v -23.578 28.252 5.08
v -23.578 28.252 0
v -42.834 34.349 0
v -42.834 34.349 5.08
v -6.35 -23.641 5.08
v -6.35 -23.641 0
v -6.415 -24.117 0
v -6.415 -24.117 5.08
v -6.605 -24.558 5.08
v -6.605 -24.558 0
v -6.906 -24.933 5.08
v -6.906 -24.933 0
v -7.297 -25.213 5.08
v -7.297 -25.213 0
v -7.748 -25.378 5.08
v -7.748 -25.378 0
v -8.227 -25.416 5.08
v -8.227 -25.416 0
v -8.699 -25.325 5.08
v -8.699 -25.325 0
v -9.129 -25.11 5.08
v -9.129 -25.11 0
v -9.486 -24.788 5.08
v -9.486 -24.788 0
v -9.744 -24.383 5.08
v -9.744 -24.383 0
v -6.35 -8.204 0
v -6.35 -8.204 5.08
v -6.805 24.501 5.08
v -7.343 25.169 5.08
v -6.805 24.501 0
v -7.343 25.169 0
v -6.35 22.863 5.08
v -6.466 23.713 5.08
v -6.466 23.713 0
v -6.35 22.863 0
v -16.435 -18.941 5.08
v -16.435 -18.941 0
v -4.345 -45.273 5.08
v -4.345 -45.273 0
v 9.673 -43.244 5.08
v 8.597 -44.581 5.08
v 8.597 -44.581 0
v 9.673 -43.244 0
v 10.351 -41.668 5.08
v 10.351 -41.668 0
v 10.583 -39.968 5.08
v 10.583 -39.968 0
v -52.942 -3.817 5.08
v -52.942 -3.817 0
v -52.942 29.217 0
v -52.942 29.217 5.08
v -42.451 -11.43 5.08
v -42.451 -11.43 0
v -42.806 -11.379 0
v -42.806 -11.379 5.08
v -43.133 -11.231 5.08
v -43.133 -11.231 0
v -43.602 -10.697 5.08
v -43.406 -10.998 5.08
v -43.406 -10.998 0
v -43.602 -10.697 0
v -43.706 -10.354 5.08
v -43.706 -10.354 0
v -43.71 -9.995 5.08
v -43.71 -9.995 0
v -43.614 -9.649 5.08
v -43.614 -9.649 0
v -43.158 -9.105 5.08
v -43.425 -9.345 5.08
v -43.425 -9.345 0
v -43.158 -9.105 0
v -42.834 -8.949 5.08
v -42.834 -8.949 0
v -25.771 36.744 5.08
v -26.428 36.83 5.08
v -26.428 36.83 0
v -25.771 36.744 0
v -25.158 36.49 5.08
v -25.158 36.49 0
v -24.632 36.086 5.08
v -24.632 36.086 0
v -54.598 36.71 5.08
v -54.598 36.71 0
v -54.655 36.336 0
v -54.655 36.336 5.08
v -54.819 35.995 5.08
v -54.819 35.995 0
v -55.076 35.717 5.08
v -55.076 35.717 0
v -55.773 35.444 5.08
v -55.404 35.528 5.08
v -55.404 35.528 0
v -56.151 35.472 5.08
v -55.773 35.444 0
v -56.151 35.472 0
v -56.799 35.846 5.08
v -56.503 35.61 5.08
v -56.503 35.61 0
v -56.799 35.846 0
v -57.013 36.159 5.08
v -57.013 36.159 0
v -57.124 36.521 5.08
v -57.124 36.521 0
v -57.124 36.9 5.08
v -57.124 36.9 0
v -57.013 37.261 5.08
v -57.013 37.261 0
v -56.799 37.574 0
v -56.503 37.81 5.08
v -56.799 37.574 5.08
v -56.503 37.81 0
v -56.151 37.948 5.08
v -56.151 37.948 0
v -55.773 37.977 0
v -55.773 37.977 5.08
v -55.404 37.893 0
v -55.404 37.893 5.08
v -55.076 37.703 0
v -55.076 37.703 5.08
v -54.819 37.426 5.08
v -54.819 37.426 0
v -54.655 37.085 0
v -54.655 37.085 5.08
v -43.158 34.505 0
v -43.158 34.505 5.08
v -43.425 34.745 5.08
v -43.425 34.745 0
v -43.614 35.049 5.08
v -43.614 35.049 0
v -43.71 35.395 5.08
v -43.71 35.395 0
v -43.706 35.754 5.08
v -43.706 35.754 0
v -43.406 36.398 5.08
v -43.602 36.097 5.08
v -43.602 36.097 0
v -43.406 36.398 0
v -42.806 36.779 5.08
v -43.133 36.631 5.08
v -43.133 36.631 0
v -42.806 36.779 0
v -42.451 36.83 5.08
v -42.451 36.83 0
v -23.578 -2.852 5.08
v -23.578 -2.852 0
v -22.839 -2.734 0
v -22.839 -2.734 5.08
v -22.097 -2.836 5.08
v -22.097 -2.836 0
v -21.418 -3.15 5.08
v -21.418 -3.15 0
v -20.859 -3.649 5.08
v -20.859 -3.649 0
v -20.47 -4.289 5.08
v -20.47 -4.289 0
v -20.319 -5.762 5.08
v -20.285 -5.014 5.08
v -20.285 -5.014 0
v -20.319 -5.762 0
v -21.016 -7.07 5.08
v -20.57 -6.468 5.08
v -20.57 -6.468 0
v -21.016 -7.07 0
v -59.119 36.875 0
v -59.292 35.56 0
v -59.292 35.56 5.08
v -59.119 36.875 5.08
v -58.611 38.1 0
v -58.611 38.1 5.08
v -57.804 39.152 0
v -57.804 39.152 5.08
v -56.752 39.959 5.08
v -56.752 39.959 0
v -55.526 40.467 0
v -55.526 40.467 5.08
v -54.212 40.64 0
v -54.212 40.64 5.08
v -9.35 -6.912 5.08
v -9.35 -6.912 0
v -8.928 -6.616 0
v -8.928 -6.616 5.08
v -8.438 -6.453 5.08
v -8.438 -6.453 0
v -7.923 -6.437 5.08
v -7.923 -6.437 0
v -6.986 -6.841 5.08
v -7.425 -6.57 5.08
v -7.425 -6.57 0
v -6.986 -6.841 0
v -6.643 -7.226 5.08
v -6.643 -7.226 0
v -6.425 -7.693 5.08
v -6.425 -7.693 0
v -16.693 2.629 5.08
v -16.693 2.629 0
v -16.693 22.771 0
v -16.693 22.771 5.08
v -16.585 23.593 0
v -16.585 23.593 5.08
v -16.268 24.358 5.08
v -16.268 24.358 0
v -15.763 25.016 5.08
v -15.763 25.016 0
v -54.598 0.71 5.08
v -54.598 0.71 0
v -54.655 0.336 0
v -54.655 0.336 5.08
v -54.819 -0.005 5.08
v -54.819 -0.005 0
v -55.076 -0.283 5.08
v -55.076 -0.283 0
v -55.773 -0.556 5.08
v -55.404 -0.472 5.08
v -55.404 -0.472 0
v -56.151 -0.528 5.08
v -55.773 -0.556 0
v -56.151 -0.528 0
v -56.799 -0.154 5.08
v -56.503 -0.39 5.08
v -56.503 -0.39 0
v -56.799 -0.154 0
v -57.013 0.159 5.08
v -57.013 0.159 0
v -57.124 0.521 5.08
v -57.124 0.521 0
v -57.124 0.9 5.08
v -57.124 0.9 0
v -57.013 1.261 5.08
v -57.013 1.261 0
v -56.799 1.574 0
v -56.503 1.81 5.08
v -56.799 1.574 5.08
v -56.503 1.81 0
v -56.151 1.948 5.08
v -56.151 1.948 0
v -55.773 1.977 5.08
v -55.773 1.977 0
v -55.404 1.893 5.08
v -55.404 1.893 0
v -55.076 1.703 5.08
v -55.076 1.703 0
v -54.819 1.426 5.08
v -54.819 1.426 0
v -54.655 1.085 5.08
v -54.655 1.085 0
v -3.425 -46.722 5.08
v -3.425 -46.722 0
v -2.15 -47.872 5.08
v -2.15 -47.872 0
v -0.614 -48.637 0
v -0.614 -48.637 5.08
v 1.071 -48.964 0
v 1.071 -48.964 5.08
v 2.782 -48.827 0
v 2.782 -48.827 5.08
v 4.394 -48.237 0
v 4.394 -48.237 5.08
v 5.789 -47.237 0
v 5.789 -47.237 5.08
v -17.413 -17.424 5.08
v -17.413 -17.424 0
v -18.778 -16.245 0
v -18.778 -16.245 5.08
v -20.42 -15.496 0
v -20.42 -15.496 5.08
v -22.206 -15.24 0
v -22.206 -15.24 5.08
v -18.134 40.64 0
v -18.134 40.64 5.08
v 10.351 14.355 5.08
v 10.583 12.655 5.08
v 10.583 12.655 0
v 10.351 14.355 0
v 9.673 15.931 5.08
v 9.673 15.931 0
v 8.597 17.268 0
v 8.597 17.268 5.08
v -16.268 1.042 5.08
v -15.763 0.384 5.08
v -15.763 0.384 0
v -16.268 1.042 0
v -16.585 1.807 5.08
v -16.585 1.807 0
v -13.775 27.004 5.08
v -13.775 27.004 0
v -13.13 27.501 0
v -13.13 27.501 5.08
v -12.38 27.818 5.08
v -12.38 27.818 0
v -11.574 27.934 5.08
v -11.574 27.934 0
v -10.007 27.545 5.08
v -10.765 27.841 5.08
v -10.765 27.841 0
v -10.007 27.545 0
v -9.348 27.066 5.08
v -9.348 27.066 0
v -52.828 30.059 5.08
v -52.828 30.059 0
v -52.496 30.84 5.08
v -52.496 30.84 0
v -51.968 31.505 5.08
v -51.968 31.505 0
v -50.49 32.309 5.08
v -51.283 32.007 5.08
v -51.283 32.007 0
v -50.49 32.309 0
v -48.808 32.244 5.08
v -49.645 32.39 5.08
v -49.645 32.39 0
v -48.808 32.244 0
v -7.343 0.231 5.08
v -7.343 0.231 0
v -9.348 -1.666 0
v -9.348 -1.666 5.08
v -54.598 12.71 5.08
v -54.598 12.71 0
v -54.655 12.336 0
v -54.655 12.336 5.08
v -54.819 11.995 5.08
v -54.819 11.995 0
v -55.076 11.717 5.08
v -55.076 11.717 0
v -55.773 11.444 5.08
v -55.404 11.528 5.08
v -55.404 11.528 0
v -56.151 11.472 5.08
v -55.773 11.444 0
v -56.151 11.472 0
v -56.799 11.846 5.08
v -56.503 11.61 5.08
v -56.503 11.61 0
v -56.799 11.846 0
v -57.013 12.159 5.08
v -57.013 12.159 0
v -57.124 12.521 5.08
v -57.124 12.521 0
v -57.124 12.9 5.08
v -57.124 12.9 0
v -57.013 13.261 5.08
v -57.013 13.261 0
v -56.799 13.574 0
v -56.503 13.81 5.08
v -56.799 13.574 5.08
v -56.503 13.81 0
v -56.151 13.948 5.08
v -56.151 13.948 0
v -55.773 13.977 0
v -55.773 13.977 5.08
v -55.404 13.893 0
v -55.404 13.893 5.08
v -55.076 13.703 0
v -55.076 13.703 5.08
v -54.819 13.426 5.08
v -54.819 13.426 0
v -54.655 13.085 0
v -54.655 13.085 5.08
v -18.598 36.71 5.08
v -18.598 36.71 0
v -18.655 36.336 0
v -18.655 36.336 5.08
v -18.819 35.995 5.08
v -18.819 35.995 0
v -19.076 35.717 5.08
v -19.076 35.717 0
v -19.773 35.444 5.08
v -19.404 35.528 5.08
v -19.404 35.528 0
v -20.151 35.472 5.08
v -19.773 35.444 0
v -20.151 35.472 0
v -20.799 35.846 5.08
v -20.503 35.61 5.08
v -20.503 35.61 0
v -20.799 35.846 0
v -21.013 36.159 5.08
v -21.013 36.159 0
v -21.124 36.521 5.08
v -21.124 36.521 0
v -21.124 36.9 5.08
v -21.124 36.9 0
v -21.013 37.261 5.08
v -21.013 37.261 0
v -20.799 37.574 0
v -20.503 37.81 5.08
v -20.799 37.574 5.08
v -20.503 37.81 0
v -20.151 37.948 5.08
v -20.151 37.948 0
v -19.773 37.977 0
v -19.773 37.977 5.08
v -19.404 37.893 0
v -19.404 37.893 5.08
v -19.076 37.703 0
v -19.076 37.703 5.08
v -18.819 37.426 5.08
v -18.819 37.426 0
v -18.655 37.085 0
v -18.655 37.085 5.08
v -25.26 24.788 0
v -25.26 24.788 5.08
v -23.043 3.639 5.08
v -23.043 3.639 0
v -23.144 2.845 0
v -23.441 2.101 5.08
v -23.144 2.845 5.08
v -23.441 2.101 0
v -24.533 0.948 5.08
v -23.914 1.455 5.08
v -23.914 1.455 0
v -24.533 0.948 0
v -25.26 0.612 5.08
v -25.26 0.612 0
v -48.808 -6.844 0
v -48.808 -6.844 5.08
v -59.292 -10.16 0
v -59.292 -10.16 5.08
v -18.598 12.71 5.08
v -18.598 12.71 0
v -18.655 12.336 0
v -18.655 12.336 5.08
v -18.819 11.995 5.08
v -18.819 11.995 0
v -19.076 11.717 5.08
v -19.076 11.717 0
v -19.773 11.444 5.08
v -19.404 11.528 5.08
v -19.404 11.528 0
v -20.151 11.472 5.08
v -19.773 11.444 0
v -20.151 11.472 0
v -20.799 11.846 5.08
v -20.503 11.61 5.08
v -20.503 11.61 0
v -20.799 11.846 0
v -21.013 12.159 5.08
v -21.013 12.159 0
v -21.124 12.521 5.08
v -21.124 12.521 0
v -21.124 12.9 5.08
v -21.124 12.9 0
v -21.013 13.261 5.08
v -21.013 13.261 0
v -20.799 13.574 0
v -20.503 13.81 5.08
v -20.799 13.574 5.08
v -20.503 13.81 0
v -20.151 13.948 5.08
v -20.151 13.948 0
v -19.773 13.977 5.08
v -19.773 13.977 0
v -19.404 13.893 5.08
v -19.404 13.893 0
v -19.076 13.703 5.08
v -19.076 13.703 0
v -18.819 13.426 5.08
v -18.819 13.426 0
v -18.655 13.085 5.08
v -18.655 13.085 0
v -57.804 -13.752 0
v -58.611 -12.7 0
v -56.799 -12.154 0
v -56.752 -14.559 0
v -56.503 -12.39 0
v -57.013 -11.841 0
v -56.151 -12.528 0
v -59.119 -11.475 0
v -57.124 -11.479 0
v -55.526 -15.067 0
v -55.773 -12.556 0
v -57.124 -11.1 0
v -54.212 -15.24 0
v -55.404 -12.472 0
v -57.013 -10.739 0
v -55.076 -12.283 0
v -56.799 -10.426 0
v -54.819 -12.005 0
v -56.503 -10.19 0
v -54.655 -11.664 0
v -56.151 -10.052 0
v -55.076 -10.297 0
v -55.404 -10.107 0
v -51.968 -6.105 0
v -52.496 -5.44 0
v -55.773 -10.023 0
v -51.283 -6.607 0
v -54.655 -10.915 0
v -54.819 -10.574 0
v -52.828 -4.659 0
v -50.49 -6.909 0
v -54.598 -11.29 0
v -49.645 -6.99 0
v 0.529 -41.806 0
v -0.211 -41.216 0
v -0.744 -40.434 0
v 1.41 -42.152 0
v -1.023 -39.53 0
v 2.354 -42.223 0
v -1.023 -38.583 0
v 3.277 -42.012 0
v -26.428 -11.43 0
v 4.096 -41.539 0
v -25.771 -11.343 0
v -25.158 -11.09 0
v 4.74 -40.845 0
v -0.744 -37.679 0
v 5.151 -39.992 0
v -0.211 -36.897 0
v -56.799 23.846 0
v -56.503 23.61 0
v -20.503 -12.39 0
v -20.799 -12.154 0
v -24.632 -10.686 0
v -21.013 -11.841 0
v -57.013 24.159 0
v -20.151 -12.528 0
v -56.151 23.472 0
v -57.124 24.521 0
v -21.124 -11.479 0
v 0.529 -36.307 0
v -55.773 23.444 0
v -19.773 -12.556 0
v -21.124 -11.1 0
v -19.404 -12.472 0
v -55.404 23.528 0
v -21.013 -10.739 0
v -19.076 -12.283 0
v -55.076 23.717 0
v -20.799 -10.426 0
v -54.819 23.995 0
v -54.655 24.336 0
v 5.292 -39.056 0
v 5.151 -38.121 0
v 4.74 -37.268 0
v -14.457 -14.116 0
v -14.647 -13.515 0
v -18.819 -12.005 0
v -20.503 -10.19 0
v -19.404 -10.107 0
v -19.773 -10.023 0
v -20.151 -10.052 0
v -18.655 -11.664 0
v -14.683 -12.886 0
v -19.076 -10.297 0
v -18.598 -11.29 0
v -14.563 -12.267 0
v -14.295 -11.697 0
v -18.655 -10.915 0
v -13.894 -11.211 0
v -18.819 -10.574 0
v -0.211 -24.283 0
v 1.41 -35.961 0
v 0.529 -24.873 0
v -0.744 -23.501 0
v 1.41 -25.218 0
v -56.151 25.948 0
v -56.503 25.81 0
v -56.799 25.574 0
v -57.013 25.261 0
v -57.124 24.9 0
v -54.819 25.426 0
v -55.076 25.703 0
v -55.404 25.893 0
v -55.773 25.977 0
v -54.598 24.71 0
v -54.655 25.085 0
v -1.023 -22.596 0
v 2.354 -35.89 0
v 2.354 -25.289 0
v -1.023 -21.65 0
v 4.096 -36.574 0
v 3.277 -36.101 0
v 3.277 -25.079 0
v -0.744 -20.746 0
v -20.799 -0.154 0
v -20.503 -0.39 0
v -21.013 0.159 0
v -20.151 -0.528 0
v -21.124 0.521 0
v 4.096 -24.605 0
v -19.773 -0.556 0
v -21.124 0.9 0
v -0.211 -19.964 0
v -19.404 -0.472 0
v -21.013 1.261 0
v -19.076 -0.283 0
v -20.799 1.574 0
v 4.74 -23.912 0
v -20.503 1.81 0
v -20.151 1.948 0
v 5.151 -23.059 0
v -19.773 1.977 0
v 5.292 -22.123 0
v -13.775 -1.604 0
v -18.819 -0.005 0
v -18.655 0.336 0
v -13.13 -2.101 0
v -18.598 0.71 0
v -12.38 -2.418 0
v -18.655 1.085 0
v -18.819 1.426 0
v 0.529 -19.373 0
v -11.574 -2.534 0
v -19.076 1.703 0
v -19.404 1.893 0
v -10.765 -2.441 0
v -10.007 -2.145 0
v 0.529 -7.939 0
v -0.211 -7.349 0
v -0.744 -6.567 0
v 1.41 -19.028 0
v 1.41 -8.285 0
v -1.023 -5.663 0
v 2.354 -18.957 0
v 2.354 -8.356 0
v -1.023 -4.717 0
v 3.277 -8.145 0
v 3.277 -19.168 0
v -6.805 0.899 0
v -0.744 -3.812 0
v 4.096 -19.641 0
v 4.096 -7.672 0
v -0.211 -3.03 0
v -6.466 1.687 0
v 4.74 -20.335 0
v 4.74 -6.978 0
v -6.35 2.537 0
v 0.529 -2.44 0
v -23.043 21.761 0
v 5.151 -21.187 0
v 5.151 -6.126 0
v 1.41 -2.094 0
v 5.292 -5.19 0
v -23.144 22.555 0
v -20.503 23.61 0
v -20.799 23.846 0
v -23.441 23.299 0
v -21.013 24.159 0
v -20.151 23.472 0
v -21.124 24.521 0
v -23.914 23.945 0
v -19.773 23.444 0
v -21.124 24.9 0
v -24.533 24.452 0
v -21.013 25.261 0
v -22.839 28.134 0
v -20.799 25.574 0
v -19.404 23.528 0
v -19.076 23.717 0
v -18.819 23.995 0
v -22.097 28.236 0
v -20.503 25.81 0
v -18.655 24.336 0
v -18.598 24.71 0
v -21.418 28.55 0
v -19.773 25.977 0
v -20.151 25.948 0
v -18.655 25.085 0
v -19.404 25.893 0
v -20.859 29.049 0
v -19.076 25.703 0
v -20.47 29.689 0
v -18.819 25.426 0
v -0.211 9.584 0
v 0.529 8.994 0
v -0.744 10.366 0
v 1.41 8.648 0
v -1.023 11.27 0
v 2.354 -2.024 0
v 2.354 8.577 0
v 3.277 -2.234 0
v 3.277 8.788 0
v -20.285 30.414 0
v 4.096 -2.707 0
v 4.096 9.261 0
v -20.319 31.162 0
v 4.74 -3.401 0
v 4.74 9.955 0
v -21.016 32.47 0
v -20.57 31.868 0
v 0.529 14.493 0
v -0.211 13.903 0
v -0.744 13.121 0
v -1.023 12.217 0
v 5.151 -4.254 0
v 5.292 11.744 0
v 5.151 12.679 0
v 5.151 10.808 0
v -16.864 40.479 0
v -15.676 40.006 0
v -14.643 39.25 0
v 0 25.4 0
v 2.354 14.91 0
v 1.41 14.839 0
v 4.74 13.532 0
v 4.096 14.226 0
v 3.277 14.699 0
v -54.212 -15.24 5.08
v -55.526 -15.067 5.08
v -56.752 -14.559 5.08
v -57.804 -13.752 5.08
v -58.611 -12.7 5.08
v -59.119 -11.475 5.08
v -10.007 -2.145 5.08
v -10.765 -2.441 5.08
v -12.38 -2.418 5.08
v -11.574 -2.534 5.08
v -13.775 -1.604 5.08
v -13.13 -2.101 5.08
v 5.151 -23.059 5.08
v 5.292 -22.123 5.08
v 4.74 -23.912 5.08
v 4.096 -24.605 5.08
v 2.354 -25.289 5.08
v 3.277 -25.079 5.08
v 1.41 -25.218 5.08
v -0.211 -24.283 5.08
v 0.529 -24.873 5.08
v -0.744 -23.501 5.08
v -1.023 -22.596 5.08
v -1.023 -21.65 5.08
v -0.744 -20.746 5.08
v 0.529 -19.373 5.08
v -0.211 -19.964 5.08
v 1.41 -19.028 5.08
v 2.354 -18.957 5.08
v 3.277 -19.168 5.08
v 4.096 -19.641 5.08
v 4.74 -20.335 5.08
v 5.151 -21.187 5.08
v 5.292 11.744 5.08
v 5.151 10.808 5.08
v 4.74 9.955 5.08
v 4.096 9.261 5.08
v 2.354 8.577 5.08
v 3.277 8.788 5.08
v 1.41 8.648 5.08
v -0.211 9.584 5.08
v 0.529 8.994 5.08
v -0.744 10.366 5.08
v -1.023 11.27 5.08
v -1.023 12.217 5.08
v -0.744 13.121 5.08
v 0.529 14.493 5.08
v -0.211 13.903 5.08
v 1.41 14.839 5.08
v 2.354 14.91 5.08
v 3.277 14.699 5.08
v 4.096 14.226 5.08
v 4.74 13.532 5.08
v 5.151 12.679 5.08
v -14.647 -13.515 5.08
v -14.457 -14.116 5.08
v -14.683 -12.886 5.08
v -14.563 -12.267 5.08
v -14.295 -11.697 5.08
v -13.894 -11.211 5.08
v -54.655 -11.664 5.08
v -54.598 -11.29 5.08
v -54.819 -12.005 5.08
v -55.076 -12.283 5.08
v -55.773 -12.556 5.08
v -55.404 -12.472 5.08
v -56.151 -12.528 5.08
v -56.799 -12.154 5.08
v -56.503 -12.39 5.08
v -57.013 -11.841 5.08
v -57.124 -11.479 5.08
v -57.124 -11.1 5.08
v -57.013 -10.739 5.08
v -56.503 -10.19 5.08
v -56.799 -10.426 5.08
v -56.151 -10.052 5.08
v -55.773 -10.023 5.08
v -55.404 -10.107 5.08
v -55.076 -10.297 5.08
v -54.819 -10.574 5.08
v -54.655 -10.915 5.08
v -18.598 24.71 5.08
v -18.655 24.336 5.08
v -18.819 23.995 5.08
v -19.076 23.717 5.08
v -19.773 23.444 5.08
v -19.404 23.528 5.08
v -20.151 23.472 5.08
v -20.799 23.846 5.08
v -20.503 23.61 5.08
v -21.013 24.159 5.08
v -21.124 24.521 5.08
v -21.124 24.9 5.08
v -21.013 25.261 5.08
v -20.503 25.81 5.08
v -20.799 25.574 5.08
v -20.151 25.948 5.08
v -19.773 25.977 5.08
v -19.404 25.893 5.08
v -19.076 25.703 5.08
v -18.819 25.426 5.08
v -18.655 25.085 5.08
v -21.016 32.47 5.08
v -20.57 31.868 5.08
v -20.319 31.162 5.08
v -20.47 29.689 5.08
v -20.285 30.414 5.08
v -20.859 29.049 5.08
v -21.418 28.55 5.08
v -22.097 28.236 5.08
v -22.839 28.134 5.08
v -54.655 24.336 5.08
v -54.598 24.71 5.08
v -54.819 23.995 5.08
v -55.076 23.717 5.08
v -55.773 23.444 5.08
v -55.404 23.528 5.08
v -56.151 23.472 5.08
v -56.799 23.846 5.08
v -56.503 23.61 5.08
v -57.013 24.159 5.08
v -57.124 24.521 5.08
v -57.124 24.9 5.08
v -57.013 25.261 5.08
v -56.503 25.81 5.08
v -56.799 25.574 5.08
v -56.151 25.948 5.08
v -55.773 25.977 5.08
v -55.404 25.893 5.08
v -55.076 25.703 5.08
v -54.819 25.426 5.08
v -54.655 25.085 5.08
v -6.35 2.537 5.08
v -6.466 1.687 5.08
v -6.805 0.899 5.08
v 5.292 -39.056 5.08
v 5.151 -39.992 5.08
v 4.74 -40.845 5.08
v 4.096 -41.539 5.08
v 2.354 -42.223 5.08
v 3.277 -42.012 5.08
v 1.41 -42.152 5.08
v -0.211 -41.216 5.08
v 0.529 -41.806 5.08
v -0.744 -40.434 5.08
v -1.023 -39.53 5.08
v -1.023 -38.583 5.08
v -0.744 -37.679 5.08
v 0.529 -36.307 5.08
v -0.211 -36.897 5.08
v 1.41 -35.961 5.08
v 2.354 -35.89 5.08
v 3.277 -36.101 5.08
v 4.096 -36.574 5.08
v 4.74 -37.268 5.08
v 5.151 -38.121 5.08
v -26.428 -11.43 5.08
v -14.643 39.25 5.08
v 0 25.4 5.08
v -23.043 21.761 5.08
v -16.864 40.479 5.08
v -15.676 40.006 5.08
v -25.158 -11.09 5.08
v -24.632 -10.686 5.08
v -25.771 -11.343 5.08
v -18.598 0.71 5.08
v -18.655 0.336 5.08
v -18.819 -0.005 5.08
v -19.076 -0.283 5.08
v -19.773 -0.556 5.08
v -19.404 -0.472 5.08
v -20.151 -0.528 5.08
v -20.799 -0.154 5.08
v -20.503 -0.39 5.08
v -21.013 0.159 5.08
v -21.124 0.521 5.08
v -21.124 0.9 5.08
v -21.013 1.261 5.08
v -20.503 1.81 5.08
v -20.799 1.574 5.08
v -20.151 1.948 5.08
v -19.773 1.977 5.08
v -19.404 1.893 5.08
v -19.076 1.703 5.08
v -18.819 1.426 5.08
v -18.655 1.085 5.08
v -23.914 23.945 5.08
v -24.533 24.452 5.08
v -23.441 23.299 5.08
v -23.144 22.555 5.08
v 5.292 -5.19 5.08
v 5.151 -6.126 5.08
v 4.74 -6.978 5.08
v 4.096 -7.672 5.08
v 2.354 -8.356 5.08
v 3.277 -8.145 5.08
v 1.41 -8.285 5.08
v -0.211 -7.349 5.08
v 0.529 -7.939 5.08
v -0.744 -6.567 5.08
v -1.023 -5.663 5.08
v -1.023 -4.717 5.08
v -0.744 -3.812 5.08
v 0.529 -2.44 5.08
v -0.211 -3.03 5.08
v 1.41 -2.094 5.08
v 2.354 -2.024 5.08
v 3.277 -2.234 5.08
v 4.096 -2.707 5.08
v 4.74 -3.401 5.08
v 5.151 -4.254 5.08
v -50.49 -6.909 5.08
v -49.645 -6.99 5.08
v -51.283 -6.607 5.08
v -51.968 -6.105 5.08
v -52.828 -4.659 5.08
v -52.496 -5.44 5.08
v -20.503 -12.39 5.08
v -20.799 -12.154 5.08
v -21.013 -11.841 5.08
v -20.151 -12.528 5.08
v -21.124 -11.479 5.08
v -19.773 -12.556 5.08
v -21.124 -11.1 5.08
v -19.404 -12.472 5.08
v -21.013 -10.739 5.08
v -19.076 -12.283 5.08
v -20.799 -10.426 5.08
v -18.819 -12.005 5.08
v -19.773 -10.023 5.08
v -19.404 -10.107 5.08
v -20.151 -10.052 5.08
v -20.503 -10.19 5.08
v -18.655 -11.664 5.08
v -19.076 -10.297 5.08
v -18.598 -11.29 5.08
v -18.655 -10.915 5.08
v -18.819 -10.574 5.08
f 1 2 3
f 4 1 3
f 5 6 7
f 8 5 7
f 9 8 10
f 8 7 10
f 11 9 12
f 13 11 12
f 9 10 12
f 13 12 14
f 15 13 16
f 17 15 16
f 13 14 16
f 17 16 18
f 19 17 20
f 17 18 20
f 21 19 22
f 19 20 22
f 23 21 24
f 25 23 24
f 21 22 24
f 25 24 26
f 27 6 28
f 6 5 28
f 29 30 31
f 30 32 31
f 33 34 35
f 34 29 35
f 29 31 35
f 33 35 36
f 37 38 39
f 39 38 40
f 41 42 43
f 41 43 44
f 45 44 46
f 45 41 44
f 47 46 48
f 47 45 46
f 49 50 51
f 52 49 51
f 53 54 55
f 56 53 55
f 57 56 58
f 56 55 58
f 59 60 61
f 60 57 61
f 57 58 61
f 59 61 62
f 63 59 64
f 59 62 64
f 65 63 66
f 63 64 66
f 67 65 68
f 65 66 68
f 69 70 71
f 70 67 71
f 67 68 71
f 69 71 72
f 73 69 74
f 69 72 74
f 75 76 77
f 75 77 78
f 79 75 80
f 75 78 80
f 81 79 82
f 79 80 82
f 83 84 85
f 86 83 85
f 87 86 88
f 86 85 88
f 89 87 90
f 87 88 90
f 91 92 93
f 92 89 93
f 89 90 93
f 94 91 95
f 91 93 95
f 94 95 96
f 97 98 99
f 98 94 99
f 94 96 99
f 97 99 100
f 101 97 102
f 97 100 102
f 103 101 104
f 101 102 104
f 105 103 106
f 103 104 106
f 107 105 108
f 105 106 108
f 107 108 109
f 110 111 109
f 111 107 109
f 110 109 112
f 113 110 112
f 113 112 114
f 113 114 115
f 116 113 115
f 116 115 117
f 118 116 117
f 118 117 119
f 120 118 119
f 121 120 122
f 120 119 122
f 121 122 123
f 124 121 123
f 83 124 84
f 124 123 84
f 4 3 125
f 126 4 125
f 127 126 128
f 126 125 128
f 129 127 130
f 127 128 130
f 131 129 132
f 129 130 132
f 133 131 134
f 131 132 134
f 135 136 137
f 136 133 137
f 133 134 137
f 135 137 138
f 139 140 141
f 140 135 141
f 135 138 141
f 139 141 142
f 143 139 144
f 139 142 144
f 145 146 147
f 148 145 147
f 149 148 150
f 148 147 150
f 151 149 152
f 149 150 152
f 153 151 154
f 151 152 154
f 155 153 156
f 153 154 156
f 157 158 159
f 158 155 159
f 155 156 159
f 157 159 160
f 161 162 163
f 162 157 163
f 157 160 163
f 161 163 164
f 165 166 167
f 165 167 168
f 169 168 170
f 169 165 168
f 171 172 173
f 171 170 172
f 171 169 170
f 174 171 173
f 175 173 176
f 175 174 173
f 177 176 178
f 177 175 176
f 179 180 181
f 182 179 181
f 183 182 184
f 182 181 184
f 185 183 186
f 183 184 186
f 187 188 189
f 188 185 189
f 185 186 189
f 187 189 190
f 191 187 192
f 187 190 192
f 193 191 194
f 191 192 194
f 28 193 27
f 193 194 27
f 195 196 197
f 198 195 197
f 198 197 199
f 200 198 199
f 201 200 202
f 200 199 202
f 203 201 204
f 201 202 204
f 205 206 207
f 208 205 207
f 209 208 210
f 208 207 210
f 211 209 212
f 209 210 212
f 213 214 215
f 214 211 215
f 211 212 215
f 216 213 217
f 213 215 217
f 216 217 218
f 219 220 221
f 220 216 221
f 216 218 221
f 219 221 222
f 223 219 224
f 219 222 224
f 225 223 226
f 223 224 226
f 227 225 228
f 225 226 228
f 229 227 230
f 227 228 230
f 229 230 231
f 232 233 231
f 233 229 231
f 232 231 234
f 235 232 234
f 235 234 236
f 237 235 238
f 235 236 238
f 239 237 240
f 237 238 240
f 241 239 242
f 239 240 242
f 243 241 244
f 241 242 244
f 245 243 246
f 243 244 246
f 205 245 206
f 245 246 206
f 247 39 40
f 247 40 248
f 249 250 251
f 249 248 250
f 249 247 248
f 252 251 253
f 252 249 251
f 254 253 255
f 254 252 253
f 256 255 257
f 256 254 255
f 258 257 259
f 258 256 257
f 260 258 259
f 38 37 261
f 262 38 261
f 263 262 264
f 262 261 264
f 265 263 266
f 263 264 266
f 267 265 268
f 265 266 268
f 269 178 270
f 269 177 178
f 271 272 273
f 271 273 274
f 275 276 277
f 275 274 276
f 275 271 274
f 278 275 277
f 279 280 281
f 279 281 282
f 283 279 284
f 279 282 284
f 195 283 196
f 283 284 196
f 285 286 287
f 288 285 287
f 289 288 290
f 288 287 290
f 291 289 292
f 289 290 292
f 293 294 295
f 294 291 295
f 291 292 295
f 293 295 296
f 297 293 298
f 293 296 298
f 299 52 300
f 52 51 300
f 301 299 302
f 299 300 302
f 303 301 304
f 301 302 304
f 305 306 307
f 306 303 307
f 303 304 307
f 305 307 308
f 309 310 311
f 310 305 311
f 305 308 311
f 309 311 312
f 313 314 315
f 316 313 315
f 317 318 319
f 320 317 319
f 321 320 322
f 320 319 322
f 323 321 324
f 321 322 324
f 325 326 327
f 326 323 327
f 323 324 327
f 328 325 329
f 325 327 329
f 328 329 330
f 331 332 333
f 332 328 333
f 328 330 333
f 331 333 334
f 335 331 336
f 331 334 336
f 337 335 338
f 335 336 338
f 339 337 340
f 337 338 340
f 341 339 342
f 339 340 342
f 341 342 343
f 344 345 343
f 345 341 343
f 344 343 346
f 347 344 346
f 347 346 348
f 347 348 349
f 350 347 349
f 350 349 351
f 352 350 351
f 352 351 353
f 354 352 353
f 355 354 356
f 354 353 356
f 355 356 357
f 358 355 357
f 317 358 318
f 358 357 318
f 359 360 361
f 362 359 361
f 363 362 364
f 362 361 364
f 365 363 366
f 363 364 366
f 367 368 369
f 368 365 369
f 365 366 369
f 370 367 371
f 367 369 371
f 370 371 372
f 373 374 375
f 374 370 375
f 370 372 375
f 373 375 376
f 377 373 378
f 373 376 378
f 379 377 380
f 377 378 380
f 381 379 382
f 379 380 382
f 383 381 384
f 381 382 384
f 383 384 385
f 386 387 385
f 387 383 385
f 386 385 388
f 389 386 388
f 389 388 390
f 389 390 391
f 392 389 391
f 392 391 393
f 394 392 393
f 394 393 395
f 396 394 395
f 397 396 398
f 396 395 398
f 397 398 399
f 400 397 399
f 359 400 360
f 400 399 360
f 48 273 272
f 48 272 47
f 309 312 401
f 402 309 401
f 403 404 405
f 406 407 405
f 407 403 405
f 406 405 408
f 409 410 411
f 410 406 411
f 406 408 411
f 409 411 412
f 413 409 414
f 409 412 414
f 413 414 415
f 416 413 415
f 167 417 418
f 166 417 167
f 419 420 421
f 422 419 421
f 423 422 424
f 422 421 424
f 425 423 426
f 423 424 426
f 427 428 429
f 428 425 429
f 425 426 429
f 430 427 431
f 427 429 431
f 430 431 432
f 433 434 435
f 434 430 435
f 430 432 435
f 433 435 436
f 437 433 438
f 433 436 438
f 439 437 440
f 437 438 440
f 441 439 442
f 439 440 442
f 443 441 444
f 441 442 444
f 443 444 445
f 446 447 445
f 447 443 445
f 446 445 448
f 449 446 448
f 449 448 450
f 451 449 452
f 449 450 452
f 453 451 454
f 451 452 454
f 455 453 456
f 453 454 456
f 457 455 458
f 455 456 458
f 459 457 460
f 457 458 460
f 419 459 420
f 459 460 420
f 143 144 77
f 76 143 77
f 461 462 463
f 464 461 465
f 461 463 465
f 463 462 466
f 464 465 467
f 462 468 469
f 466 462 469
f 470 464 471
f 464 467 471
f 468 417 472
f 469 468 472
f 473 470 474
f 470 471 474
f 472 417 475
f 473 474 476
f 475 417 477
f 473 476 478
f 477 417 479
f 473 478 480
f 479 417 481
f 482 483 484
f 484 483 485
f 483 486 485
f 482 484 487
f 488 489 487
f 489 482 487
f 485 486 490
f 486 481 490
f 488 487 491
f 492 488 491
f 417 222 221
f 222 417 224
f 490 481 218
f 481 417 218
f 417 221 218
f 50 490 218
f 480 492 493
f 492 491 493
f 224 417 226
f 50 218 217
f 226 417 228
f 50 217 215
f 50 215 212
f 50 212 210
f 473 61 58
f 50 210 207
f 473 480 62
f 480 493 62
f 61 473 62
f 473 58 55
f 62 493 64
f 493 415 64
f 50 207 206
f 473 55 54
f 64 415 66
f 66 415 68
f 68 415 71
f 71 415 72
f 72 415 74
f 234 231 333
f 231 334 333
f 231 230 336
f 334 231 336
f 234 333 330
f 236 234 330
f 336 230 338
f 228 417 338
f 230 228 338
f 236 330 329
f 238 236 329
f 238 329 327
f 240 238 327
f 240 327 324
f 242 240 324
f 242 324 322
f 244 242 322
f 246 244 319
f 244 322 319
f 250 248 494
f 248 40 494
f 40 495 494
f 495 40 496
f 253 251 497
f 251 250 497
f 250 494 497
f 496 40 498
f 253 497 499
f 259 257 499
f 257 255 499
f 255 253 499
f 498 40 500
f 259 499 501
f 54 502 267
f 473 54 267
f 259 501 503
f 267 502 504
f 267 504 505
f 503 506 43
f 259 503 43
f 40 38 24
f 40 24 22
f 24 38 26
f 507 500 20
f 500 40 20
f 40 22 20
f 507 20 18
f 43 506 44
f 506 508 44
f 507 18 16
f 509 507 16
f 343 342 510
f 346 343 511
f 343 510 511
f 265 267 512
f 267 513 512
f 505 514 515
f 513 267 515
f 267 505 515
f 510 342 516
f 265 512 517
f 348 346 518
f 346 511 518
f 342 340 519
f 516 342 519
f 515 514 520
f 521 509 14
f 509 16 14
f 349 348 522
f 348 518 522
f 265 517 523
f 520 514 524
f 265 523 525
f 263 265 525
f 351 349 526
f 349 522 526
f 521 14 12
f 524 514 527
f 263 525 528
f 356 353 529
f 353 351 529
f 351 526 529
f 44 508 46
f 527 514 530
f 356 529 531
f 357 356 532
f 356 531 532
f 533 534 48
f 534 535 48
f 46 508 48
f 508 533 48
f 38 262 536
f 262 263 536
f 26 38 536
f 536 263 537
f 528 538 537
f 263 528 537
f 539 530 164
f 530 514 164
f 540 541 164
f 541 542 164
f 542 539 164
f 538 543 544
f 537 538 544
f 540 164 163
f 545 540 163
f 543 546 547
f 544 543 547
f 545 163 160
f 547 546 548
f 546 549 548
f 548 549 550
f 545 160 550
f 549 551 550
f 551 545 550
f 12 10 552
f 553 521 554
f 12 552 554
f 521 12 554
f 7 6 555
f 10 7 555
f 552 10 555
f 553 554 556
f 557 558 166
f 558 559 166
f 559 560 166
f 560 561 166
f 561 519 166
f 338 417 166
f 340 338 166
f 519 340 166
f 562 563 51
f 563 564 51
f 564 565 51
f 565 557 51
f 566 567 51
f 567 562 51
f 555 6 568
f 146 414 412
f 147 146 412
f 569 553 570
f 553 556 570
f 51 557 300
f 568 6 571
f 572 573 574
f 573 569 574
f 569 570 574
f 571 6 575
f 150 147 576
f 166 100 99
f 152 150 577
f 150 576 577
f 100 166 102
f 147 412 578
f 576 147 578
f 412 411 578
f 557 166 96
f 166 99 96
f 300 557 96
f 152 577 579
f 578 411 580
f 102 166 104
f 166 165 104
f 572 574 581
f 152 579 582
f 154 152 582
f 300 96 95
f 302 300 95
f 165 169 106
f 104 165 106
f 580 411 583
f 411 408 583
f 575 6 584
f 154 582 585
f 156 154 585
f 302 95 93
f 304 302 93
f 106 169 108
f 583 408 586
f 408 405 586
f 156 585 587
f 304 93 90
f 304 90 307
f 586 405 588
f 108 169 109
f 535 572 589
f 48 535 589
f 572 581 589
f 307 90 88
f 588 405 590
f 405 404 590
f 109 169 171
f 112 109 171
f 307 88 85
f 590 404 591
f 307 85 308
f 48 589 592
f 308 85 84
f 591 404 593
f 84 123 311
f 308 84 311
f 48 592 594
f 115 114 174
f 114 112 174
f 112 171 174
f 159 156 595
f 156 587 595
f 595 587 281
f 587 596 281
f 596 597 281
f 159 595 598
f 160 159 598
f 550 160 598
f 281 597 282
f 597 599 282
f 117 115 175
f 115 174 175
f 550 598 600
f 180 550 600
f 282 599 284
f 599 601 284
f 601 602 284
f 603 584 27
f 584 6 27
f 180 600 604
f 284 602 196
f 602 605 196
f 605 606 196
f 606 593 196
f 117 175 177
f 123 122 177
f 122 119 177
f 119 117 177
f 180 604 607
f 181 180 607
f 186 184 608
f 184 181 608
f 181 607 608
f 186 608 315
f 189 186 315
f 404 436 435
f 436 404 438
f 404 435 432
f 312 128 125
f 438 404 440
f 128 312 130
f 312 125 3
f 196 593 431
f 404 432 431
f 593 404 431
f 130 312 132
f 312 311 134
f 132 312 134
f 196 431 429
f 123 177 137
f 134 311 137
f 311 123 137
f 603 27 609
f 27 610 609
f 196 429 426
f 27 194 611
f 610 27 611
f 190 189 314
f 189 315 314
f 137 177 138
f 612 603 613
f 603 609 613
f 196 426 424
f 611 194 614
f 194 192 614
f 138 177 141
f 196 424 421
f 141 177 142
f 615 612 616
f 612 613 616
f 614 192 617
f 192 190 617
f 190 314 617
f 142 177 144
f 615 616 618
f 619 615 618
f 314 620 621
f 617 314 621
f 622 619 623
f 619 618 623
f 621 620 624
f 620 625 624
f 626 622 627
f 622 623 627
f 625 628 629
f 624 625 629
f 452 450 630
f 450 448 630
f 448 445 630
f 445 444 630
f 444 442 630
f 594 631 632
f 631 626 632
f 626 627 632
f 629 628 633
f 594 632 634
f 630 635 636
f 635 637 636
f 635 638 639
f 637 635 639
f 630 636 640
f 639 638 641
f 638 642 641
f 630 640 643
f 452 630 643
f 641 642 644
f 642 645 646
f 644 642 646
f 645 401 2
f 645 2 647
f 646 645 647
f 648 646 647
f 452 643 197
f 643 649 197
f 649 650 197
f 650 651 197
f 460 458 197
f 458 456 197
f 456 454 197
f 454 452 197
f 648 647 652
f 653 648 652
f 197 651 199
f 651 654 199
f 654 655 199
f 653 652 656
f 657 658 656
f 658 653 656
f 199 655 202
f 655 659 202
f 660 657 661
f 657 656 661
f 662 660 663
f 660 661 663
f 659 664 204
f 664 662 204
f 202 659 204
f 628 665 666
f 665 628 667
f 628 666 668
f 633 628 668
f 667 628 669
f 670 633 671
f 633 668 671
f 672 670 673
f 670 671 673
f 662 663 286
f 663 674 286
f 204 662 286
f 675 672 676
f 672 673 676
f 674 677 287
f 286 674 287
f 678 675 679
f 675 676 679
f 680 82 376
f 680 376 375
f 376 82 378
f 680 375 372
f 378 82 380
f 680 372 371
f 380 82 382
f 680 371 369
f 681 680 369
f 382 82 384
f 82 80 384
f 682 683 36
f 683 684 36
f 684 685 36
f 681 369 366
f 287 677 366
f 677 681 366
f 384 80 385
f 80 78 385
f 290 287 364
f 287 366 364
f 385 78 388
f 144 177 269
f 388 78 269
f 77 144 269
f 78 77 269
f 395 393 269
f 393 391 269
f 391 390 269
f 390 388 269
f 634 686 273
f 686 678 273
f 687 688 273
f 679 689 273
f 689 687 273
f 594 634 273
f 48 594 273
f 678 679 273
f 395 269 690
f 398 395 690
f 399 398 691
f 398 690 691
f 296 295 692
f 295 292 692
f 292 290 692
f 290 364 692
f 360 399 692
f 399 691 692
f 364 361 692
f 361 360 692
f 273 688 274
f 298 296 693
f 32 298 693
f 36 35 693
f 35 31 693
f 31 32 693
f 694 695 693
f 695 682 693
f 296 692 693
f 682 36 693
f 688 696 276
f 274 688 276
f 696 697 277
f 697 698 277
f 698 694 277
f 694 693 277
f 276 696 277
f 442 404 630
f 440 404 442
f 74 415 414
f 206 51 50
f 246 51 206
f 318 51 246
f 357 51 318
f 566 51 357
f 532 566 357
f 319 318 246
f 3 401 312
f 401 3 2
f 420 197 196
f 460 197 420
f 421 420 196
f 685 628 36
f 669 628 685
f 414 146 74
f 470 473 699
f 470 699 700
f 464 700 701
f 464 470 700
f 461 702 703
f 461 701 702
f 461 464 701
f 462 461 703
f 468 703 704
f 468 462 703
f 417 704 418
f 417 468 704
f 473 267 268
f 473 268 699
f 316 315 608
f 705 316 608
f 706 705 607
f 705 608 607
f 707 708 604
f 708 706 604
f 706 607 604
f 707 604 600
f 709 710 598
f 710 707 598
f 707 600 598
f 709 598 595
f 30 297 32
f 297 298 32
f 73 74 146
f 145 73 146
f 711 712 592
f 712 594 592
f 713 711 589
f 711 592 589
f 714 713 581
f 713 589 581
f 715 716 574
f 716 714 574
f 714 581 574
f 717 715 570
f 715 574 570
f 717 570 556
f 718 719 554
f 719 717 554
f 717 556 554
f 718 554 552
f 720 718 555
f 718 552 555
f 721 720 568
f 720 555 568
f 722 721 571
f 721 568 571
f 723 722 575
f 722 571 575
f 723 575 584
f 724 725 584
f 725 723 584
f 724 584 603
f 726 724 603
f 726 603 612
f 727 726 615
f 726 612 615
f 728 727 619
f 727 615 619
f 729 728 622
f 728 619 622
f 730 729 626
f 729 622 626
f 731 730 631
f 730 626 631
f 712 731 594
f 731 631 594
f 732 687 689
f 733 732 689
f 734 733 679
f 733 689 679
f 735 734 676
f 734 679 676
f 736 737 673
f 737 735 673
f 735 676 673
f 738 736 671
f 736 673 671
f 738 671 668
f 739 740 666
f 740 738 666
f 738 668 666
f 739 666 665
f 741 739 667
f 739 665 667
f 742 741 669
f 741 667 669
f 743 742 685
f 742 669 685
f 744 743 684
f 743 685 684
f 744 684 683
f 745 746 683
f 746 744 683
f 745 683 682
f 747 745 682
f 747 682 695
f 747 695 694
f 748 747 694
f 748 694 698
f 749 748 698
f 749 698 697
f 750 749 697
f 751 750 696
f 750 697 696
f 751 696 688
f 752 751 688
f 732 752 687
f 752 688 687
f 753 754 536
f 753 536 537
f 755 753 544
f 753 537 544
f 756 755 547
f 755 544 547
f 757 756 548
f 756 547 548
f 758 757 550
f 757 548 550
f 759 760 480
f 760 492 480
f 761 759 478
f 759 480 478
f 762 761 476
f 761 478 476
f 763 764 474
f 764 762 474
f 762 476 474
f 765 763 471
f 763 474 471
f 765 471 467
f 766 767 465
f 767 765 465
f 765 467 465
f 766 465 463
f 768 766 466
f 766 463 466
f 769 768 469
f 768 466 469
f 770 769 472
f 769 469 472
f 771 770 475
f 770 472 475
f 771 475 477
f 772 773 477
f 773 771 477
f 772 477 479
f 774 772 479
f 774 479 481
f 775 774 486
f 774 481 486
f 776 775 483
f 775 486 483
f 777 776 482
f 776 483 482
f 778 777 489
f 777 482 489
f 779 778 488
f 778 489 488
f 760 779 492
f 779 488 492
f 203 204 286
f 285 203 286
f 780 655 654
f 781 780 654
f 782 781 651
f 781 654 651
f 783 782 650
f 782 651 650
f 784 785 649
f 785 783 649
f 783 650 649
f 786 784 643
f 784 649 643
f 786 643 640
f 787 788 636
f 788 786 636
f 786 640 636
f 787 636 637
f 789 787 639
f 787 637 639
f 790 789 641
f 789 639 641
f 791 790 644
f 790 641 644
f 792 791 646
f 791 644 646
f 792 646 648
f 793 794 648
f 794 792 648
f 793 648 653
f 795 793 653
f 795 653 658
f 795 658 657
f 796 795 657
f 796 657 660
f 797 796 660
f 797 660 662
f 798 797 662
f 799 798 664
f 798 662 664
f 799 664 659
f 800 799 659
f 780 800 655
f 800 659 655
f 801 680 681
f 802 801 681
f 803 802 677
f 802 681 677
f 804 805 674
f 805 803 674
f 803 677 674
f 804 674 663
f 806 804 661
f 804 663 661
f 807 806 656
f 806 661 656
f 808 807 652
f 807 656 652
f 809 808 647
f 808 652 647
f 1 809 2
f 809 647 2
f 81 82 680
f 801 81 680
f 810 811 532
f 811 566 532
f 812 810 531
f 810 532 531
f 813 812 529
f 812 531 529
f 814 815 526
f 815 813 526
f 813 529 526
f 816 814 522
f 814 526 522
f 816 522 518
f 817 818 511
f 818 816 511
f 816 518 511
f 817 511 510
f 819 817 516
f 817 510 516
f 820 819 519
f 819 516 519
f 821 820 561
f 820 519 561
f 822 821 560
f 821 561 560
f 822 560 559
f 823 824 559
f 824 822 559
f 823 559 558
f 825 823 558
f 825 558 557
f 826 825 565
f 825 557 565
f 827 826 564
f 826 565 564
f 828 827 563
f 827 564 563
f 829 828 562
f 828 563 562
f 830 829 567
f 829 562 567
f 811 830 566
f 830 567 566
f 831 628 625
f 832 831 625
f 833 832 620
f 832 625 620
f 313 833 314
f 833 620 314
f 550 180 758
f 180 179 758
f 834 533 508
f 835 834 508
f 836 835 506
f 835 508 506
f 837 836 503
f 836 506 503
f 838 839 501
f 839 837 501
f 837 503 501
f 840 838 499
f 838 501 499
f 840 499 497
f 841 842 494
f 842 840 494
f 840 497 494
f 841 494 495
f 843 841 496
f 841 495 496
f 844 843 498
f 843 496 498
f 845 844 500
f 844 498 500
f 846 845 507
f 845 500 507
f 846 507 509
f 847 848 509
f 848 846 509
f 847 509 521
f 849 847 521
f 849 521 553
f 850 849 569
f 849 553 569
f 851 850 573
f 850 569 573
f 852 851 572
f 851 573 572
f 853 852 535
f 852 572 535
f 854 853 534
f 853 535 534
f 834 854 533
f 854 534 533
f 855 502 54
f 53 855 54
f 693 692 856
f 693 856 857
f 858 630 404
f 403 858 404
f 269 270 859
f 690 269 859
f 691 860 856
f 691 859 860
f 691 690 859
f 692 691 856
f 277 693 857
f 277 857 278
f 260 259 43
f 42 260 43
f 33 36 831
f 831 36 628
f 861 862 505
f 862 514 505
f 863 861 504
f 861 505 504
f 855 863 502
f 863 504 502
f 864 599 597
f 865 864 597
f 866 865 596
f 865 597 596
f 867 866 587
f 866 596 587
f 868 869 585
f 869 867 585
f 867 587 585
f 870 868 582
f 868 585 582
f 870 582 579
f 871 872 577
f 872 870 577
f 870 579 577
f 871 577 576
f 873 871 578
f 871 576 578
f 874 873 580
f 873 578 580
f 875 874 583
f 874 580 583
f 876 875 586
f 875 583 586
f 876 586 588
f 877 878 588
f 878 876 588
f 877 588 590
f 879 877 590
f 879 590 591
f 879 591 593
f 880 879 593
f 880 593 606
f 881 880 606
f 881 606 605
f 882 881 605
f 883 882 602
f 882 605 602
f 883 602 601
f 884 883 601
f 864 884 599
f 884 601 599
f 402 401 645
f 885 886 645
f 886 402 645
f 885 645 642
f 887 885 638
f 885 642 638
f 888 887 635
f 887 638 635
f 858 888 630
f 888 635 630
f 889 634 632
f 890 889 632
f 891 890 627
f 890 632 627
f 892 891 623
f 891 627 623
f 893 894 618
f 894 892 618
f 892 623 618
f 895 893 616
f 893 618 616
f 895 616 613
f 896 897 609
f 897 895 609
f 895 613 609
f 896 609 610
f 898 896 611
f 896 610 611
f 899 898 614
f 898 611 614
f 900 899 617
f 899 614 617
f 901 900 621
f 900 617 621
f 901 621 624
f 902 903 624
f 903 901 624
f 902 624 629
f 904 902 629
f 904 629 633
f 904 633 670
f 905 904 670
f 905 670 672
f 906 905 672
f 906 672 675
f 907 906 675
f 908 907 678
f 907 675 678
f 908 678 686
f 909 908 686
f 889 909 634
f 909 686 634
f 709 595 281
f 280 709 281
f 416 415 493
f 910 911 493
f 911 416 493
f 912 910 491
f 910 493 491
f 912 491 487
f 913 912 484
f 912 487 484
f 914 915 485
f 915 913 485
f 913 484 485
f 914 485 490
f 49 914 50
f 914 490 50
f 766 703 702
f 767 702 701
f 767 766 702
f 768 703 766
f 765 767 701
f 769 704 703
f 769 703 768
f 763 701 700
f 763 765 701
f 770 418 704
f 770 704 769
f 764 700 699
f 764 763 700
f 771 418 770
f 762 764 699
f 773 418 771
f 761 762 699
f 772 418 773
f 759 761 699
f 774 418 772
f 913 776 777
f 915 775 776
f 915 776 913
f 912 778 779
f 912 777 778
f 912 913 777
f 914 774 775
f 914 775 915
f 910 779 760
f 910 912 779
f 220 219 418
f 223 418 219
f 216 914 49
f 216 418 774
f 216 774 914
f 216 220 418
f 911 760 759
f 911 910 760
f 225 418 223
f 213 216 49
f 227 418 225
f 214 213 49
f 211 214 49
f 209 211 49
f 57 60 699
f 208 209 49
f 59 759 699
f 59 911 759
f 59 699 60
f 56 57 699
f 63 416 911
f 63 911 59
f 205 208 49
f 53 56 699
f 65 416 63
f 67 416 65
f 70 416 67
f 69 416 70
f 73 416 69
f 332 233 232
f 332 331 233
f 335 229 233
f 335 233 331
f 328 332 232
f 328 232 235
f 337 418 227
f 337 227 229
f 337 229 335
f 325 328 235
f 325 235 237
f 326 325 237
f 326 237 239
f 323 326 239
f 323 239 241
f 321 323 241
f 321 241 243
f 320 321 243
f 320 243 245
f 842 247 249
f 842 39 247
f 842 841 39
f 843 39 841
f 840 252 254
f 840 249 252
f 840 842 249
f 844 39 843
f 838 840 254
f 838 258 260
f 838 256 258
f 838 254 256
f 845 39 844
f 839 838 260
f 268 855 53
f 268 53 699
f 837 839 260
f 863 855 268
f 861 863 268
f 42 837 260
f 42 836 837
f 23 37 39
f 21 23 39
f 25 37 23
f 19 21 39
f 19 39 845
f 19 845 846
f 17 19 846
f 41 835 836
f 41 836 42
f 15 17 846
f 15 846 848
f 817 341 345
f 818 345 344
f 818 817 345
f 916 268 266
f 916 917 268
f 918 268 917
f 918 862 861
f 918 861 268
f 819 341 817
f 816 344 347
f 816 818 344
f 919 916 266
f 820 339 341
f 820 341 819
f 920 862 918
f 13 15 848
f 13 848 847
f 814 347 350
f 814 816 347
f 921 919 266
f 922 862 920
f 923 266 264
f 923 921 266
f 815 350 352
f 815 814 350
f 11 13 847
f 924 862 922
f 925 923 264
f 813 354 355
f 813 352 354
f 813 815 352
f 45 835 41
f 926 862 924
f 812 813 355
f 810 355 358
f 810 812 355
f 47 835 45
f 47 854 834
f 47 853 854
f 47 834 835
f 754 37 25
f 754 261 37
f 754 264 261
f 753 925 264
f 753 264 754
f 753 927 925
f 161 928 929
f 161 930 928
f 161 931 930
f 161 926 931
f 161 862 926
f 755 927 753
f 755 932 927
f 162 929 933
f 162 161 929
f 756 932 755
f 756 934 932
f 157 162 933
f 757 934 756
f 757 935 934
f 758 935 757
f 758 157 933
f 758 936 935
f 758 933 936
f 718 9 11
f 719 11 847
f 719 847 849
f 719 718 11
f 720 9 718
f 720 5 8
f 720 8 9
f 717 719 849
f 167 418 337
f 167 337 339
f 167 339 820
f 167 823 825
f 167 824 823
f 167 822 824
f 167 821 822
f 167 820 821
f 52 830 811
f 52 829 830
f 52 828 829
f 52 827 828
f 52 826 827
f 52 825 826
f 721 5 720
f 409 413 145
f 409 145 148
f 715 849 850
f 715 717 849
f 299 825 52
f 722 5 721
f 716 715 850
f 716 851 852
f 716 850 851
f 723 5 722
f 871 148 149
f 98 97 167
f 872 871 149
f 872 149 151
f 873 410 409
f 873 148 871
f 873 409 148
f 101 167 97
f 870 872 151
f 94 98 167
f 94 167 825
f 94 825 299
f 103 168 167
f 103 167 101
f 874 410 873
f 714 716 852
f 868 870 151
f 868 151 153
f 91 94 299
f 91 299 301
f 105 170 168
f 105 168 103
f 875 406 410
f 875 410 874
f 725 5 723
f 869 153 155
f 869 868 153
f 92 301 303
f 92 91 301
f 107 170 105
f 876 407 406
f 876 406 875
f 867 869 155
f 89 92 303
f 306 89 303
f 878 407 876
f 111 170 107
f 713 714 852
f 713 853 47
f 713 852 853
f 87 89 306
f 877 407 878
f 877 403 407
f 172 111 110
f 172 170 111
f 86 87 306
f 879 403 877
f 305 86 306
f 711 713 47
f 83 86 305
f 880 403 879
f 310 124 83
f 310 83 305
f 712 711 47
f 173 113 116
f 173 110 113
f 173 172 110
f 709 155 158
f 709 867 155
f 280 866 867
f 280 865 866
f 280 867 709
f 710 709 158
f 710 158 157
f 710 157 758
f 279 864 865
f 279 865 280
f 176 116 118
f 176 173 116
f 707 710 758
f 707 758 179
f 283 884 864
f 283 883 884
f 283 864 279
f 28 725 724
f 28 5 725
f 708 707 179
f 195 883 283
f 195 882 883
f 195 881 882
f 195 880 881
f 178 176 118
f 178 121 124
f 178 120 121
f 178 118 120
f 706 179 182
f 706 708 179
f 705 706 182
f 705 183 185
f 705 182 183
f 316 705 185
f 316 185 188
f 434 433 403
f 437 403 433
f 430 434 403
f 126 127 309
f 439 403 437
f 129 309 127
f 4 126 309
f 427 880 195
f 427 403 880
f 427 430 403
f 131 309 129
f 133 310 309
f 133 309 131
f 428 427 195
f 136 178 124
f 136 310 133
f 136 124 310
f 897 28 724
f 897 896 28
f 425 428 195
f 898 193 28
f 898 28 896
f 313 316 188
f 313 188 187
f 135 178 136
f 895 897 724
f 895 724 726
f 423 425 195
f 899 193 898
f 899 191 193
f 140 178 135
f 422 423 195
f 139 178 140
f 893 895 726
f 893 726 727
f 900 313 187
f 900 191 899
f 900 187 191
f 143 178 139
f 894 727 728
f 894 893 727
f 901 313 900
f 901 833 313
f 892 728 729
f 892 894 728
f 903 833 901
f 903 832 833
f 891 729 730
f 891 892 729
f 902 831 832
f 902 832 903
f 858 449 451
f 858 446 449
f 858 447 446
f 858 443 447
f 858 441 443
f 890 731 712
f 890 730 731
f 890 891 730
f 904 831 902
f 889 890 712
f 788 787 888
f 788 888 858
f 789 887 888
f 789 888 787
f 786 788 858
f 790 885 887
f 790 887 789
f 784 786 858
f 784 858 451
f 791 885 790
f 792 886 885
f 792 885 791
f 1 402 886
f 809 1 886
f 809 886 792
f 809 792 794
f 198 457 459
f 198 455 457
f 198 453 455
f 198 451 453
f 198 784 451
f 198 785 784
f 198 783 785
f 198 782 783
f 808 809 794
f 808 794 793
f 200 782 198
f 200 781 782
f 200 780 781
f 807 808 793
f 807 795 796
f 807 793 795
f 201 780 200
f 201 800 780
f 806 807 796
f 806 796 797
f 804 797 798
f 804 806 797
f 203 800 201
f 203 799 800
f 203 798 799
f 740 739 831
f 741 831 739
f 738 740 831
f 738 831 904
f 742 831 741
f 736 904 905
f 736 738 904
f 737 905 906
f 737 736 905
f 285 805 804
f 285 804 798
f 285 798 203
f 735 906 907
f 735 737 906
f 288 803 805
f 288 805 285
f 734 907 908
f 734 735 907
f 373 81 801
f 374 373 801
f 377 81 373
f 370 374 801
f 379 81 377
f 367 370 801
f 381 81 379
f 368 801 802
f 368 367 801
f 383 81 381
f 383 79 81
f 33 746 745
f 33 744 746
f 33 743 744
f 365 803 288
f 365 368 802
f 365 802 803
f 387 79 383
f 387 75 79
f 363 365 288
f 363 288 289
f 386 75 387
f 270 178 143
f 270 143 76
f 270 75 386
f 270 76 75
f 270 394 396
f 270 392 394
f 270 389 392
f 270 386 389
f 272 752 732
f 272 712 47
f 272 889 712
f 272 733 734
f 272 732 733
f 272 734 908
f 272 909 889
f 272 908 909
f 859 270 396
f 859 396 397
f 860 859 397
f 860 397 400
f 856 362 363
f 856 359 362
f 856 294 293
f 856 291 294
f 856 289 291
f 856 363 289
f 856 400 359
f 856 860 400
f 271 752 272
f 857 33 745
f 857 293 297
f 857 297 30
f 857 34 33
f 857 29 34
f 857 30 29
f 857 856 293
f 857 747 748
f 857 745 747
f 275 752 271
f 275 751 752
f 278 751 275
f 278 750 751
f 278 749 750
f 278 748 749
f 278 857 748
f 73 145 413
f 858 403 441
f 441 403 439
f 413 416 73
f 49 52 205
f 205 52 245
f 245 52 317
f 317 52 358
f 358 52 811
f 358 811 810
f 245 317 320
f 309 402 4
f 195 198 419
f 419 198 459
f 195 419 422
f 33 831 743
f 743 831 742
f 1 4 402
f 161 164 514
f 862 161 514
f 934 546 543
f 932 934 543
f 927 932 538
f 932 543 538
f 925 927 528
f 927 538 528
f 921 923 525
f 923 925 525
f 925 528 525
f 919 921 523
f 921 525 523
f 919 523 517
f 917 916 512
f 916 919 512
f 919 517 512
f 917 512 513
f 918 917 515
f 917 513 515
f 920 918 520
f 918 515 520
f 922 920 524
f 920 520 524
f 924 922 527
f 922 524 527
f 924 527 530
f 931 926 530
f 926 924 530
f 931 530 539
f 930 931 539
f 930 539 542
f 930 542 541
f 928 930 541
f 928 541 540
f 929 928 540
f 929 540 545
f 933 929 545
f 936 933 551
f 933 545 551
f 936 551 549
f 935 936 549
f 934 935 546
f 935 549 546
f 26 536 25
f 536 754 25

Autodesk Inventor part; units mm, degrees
ref_plane "YZ Plane" through (0, 0, 0) normal (1, 0, 0) x (0, 1, 0)
ref_plane "XZ Plane" through (0, 0, 0) normal (0, 1, 0) x (-1, 0, 0)
ref_plane "XY Plane" through (0, 0, 0) normal (0, 0, 1) x (1, 0, 0)
sketch "Sketch1" plane through (0, 0, 0) normal (0, 0, 1) x (1, 0, 0)
  line L0 (-42.4511, 36.83) -> (-26.4283, 36.83)
  arc A0 (-24.6322, 36.0861) -> (-26.4283, 36.83) centre (-26.4283, 34.29) ccw
  line L1 (-24.6322, 36.0861) -> (-21.0157, 32.4696)
  arc A1 (-23.5785, 28.252) -> (-21.0157, 32.4696) centre (-22.8118, 30.6735) ccw
  line L2 (-23.5785, 28.252) -> (-42.8345, 34.3492)
  arc A2 (-42.4511, 36.83) -> (-42.8345, 34.3492) centre (-42.4511, 35.56) ccw
  line L3 (-42.8345, -8.9492) -> (-23.5785, -2.852)
  arc A3 (-21.0157, -7.0696) -> (-23.5785, -2.852) centre (-22.8118, -5.2735) ccw
  line L4 (-21.0157, -7.0696) -> (-24.6322, -10.6861)
  arc A4 (-26.4283, -11.43) -> (-24.6322, -10.6861) centre (-26.4283, -8.89) ccw
  line L5 (-26.4283, -11.43) -> (-42.4511, -11.43)
  arc A5 (-42.8345, -8.9492) -> (-42.4511, -11.43) centre (-42.4511, -10.16) ccw
  line L6 (-52.9416, -3.8174) -> (-52.9416, 29.2174)
  arc A6 (-48.8082, 32.2443) -> (-52.9416, 29.2174) centre (-49.7666, 29.2174) ccw
  line L7 (-48.8082, 32.2443) -> (-25.2598, 24.7879)
  arc A7 (-23.0433, 21.7611) -> (-25.2598, 24.7879) centre (-26.2183, 21.7611) ccw
  line L8 (-23.0433, 21.7611) -> (-23.0433, 3.6389)
  arc A8 (-25.2598, 0.6121) -> (-23.0433, 3.6389) centre (-26.2183, 3.6389) ccw
  line L9 (-25.2598, 0.6121) -> (-48.8082, -6.8443)
  arc A9 (-52.9416, -3.8174) -> (-48.8082, -6.8443) centre (-49.7666, -3.8174) ccw
  line L10 (-6.35, 22.8627) -> (-6.35, 2.5373)
  arc A10 (-7.3432, 0.2307) -> (-6.35, 2.5373) centre (-9.525, 2.5373) ccw
  line L11 (-7.3432, 0.2307) -> (-9.3482, -1.6658)
  arc A11 (-13.775, -1.6043) -> (-9.3482, -1.6658) centre (-11.53, 0.6408) ccw
  line L12 (-13.775, -1.6043) -> (-15.7633, 0.384)
  arc A12 (-16.6933, 2.629) -> (-15.7633, 0.384) centre (-13.5183, 2.629) ccw
  line L13 (-16.6933, 2.629) -> (-16.6933, 22.771)
  arc A13 (-15.7633, 25.016) -> (-16.6933, 22.771) centre (-13.5183, 22.771) ccw
  line L14 (-15.7633, 25.016) -> (-13.775, 27.0043)
  arc A14 (-9.3482, 27.0658) -> (-13.775, 27.0043) centre (-11.53, 24.7592) ccw
  line L15 (-9.3482, 27.0658) -> (-7.3432, 25.1693)
  arc A15 (-6.35, 22.8627) -> (-7.3432, 25.1693) centre (-9.525, 22.8627) ccw
  circle A16 centre (-55.8683, 24.7103) radius 1.27
  circle A17 centre (-55.8683, 0.7103) radius 1.27
  circle A18 centre (-19.8683, -11.2897) radius 1.27
  circle A19 centre (-19.8683, 12.7103) radius 1.27
  circle A20 centre (-19.8683, 36.7103) radius 1.27
  circle A21 centre (-19.8683, 24.7103) radius 1.27
  circle A22 centre (-19.8683, 0.7103) radius 1.27
  circle A23 centre (-55.8683, -11.2897) radius 1.27
  circle A24 centre (-55.8683, 12.7103) radius 1.27
  circle A25 centre (-55.8683, 36.7103) radius 1.27
  arc A26 (-54.2116, 40.64) -> (-59.2916, 35.56) centre (-54.2116, 35.56) ccw
  line L16 (-59.2916, -10.16) -> (-59.2916, 35.56)
  arc A27 (-59.2916, -10.16) -> (-54.2116, -15.24) centre (-54.2116, -10.16) ccw
  line L17 (-18.1336, -15.24) -> (-54.2116, -15.24)
  line L18 (0, 0) -> (0, 25.4) construction
  line L19 (-14.6427, 39.2505) -> (0, 25.4)
  arc A28 (-14.6427, 39.2505) -> (-18.1336, 40.64) centre (-18.1336, 35.56) ccw
  line L20 (-54.2116, 40.64) -> (-18.1336, 40.64)
  line L21 (0, 25.4) -> (10.5833, 15.3892)
  line L22 (10.5833, 15.3892) -> (10.5833, -42.7021)
  circle A29 centre (2.1167, 11.7435) radius 3.175
  line L23 (2.1167, 11.7435) -> (2.1167, -39.0565) construction
  circle A30 centre (2.1167, -39.0565) radius 3.175
  line L24 (-0.6484, -53.3263) -> (10.5833, -42.7021)
  line L25 (-18.1336, -15.24) -> (-0.6484, -53.3263)
  circle A31 centre (2.1167, -5.1898) radius 3.175
  circle A32 centre (2.1167, -22.1231) radius 3.175
  dimension "d0" = 8.4667
  dimension "d1" = 8.4667
  dimension "d2" = 8.4667
  dimension "d6" = 8.4667
  dimension "d7" = 6.35
  dimension "d10" = 50.8
  dimension "d11" = 8.4667
  dimension "d12" = 16.9333
  dimension "d13" = 16.9333
  dimension "d22" = 16.9333
extrude "Plate2" add sketch "Sketch1" along normal blind 5.08
fillet "Fillet1" radius 6.35 4 edges at (-18.1336, -15.24, 2.54) (-0.6484, -53.3263, 2.54) (10.5833, -42.7021, 2.54) (10.5833, 15.3892, 2.54)
sketch "Sketch2" plane through (0, 0, 5.08) normal (0, 0, 1) x (1, 0, 0)
  line L0 (-6.35, -4.0743) -> (-15.2168, -12.4614)
  line L1 (-15.2168, -12.4614) -> (-6.35, -31.7753)
  line L2 (-6.35, -31.7753) -> (-6.35, -4.0743)
  line L3 (-6.35, 22.8627) -> (-6.35, 2.5373) projected
  line L4 (-22.2055, -15.24) -> (-54.2116, -15.24) projected
  line L5 (-26.4283, -11.43) -> (-42.4511, -11.43) projected
  line L6 (-4.3455, -45.2733) -> (-16.4346, -18.9406) projected
  line L7 (-7.3432, 0.2307) -> (-9.3482, -1.6658) projected
  point P0 (0, 0)
  dimension "d15" = 3.81
  dimension "d16" = 3.81
  dimension "d17" = 3.81
extrude "Extrusion1" cut sketch "Sketch2" against normal blind 25.4
fillet "Fillet2" radius 1.778 2 edges at (-6.35, -31.7753, 2.54) (-6.35, -4.0743, 2.54)
fillet "Fillet3" radius 2.54 1 edges at (-15.2168, -12.4614, 2.54)
equation "\"d13\" = d12"
equation "\"d22\" = d12"
equation "\"d14\" = Thickness"
equation "\"BendRadius\" = Thickness"
equation "\"BendReliefWidth\" = Thickness"
equation "\"BendReliefDepth\" = 0.5 * Thickness"
equation "\"CornerReliefSize\" = 4 * Thickness"
equation "\"MinimumRemnant\" = 2 * Thickness"
equation "\"TransitionRadius\" = BendRadius"
equation "\"JacobiRadiusSize\" = BendRadius"
equation "\"GapSize\" = Thickness"
equation "\"Thickness\" = 5.08"
properties part number "UpperShoulderBracket"
